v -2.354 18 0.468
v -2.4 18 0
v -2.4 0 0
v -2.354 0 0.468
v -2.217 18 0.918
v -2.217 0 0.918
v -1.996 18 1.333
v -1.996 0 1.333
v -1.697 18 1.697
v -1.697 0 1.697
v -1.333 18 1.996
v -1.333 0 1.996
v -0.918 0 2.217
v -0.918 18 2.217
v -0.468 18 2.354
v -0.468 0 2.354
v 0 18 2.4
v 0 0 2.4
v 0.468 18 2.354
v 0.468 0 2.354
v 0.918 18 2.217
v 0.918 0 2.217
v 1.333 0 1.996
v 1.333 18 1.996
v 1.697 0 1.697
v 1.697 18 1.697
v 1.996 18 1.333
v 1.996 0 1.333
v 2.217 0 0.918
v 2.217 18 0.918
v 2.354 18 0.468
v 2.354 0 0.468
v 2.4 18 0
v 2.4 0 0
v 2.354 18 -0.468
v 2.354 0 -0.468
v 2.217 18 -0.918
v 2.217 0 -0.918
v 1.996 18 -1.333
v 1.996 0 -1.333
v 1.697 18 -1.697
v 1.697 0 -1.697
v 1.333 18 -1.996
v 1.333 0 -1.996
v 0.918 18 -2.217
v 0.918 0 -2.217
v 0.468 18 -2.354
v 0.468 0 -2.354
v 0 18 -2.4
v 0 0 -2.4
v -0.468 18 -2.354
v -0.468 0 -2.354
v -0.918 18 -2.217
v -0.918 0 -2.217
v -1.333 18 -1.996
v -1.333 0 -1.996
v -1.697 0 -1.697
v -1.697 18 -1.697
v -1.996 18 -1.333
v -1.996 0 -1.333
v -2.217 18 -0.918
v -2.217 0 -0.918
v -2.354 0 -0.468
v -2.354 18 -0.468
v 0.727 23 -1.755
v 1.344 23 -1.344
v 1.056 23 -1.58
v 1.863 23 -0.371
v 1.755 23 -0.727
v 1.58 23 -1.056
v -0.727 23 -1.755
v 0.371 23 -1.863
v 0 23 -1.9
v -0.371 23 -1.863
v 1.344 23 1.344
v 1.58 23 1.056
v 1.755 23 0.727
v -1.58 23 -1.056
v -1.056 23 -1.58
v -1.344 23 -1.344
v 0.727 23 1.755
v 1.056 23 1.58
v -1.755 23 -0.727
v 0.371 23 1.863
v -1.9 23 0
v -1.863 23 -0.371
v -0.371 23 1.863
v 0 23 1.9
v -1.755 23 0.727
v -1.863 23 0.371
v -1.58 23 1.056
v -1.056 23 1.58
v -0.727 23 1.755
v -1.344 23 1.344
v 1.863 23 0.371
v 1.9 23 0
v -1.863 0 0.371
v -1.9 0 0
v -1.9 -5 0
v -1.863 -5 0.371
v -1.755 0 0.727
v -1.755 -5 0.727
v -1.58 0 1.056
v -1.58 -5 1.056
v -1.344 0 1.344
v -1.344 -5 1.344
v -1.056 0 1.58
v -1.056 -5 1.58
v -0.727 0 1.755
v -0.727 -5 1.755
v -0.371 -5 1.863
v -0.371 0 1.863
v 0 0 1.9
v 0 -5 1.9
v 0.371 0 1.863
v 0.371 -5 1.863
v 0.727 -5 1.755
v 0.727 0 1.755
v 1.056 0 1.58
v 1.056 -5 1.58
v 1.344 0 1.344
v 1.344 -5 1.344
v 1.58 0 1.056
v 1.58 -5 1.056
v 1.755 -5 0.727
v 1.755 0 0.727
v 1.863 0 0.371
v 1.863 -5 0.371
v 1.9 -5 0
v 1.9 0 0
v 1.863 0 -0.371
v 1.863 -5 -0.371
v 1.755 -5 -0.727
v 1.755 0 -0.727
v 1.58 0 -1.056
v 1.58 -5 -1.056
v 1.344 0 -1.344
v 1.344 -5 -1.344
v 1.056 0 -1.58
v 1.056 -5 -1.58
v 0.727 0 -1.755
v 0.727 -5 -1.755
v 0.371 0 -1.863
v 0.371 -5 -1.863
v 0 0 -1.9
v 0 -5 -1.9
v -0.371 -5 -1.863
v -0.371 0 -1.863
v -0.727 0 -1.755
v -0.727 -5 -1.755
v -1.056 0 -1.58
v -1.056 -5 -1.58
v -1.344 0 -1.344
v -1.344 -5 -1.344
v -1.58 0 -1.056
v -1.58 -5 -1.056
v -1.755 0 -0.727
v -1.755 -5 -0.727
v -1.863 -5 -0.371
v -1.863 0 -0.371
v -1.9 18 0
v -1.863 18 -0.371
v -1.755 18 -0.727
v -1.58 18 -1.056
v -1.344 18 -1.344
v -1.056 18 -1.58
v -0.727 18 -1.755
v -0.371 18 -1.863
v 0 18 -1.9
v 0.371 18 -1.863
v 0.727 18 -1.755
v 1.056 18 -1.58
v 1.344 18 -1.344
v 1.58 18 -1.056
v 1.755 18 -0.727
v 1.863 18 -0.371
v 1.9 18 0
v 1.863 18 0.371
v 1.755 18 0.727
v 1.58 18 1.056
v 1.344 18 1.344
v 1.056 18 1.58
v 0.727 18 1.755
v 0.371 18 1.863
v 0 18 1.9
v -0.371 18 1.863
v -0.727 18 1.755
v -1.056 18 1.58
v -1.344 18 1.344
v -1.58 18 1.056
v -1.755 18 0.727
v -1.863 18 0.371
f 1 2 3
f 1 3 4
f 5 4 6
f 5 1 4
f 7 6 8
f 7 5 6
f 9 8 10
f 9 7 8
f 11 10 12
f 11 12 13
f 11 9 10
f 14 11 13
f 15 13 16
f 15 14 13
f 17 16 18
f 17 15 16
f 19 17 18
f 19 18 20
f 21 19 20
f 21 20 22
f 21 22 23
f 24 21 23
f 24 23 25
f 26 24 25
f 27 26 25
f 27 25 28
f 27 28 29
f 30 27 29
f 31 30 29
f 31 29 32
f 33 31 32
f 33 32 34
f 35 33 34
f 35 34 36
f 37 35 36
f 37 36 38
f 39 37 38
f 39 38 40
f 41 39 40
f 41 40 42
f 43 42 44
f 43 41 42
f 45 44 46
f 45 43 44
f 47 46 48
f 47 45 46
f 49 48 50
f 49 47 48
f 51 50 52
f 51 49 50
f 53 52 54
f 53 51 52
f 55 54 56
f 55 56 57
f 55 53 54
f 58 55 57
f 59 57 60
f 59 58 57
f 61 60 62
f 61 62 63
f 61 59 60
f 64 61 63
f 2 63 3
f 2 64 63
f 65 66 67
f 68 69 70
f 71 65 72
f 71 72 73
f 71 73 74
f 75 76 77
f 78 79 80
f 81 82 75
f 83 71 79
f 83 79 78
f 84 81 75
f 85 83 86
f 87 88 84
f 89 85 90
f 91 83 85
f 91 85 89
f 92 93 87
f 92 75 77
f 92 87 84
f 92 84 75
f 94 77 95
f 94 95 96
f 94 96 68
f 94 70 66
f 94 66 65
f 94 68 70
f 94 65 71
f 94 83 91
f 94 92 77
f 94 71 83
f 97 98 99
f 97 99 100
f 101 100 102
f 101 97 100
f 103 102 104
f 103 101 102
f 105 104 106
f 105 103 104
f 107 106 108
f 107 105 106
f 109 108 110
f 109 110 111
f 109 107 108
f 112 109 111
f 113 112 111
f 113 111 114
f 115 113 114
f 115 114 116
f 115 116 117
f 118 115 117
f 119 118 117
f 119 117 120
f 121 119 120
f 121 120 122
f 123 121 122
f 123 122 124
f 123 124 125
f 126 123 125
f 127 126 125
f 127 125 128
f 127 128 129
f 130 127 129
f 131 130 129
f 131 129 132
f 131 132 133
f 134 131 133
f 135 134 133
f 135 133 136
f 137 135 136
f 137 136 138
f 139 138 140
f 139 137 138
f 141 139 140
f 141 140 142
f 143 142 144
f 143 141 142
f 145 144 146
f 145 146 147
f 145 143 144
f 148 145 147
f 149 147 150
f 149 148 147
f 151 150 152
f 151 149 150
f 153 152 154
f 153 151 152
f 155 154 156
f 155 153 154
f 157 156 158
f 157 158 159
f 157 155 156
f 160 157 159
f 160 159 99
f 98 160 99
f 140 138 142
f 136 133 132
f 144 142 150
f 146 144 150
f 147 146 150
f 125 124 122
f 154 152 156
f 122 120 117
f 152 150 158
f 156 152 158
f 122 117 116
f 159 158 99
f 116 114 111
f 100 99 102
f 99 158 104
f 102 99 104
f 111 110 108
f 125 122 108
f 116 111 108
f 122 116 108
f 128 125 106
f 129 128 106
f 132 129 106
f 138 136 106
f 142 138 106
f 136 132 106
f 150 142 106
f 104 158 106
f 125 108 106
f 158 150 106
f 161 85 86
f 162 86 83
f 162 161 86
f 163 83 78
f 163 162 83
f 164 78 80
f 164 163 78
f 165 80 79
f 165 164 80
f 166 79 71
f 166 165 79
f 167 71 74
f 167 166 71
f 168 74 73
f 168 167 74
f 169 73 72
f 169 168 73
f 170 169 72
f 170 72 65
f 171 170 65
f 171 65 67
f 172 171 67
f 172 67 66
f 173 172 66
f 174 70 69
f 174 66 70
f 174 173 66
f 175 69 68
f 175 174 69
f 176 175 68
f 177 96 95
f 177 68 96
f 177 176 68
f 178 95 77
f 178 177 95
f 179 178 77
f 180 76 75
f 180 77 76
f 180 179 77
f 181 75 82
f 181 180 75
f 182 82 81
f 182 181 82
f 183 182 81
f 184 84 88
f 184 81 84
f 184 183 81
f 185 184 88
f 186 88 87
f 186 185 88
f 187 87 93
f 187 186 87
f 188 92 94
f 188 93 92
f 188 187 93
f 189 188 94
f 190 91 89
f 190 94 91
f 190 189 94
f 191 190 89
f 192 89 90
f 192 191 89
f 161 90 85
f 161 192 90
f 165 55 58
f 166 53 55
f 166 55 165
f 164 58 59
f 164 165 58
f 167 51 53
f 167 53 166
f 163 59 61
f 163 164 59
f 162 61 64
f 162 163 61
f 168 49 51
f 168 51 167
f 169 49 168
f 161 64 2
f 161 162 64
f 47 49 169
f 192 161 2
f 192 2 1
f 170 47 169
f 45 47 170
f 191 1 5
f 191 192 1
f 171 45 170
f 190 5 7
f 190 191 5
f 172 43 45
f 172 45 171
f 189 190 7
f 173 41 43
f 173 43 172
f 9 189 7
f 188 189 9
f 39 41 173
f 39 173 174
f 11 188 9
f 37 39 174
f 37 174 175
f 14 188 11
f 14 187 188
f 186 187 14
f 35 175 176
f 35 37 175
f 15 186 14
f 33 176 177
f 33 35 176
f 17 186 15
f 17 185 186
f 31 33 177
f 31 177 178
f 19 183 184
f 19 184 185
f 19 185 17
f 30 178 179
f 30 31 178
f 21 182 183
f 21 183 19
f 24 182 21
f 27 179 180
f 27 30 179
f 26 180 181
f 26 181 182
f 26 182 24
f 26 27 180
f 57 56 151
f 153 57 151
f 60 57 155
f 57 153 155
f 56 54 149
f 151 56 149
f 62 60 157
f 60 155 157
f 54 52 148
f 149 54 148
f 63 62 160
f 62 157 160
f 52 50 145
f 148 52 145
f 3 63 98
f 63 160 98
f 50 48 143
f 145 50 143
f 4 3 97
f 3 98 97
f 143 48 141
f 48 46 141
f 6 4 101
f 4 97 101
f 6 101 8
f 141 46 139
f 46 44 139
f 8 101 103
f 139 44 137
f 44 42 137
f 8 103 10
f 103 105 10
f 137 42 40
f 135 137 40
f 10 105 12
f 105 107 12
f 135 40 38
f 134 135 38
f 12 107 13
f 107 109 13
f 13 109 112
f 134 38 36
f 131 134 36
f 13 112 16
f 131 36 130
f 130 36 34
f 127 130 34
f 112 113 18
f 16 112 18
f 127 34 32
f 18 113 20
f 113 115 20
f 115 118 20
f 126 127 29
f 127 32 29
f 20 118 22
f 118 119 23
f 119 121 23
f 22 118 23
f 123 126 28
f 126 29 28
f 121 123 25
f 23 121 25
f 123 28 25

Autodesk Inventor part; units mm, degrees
ref_plane "YZ Plane" through (0, 0, 0) normal (1, 0, 0) x (0, 1, 0)
ref_plane "XY Plane" through (0, 0, 0) normal (0, 0, 1) x (1, 0, 0)
sketch "Boceto1" plane through (0, 0, 0) normal (1, 0, 0) x (0, 1, 0)
  line L0 (0, 0) -> (18, 0)
  line L1 (0, 0) -> (0, -4.8)
  line L2 (18, 0) -> (23, 0)
  line L3 (18, 0) -> (18, -3.8)
  line L4 (0, 0) -> (-5, 0)
  line L5 (-5, 0) -> (-5, 3.8)
  dimension "d0" = 18
  dimension "d1" = 4.8
  dimension "d2" = 5
  dimension "d4" = 3.8
  dimension "d5" = 5
  dimension "d6" = 3.8
sketch "Boceto4" plane through (0, 0, 0) normal (0, 1, 0) x (-1, 0, 0)
  circle A0 centre (0, 0) radius 2.4
  dimension "d10" = 4.8
sweep "Barrido1" add profiles "Boceto4" path "Boceto1" path curves L0
ref_plane "Plano de trabajo1" through (0, 9, 0) normal (0, 1, 0) x (-1, 0, 0)
sketch "Boceto5" plane through (0, 9, 0) normal (0, 1, 0) x (-1, 0, 0)
  circle A0 centre (0, 0) radius 1.9
  dimension "d14" = 3.8
extrude "Extrusión1" add sketch "Boceto5" along normal mid plane 28
